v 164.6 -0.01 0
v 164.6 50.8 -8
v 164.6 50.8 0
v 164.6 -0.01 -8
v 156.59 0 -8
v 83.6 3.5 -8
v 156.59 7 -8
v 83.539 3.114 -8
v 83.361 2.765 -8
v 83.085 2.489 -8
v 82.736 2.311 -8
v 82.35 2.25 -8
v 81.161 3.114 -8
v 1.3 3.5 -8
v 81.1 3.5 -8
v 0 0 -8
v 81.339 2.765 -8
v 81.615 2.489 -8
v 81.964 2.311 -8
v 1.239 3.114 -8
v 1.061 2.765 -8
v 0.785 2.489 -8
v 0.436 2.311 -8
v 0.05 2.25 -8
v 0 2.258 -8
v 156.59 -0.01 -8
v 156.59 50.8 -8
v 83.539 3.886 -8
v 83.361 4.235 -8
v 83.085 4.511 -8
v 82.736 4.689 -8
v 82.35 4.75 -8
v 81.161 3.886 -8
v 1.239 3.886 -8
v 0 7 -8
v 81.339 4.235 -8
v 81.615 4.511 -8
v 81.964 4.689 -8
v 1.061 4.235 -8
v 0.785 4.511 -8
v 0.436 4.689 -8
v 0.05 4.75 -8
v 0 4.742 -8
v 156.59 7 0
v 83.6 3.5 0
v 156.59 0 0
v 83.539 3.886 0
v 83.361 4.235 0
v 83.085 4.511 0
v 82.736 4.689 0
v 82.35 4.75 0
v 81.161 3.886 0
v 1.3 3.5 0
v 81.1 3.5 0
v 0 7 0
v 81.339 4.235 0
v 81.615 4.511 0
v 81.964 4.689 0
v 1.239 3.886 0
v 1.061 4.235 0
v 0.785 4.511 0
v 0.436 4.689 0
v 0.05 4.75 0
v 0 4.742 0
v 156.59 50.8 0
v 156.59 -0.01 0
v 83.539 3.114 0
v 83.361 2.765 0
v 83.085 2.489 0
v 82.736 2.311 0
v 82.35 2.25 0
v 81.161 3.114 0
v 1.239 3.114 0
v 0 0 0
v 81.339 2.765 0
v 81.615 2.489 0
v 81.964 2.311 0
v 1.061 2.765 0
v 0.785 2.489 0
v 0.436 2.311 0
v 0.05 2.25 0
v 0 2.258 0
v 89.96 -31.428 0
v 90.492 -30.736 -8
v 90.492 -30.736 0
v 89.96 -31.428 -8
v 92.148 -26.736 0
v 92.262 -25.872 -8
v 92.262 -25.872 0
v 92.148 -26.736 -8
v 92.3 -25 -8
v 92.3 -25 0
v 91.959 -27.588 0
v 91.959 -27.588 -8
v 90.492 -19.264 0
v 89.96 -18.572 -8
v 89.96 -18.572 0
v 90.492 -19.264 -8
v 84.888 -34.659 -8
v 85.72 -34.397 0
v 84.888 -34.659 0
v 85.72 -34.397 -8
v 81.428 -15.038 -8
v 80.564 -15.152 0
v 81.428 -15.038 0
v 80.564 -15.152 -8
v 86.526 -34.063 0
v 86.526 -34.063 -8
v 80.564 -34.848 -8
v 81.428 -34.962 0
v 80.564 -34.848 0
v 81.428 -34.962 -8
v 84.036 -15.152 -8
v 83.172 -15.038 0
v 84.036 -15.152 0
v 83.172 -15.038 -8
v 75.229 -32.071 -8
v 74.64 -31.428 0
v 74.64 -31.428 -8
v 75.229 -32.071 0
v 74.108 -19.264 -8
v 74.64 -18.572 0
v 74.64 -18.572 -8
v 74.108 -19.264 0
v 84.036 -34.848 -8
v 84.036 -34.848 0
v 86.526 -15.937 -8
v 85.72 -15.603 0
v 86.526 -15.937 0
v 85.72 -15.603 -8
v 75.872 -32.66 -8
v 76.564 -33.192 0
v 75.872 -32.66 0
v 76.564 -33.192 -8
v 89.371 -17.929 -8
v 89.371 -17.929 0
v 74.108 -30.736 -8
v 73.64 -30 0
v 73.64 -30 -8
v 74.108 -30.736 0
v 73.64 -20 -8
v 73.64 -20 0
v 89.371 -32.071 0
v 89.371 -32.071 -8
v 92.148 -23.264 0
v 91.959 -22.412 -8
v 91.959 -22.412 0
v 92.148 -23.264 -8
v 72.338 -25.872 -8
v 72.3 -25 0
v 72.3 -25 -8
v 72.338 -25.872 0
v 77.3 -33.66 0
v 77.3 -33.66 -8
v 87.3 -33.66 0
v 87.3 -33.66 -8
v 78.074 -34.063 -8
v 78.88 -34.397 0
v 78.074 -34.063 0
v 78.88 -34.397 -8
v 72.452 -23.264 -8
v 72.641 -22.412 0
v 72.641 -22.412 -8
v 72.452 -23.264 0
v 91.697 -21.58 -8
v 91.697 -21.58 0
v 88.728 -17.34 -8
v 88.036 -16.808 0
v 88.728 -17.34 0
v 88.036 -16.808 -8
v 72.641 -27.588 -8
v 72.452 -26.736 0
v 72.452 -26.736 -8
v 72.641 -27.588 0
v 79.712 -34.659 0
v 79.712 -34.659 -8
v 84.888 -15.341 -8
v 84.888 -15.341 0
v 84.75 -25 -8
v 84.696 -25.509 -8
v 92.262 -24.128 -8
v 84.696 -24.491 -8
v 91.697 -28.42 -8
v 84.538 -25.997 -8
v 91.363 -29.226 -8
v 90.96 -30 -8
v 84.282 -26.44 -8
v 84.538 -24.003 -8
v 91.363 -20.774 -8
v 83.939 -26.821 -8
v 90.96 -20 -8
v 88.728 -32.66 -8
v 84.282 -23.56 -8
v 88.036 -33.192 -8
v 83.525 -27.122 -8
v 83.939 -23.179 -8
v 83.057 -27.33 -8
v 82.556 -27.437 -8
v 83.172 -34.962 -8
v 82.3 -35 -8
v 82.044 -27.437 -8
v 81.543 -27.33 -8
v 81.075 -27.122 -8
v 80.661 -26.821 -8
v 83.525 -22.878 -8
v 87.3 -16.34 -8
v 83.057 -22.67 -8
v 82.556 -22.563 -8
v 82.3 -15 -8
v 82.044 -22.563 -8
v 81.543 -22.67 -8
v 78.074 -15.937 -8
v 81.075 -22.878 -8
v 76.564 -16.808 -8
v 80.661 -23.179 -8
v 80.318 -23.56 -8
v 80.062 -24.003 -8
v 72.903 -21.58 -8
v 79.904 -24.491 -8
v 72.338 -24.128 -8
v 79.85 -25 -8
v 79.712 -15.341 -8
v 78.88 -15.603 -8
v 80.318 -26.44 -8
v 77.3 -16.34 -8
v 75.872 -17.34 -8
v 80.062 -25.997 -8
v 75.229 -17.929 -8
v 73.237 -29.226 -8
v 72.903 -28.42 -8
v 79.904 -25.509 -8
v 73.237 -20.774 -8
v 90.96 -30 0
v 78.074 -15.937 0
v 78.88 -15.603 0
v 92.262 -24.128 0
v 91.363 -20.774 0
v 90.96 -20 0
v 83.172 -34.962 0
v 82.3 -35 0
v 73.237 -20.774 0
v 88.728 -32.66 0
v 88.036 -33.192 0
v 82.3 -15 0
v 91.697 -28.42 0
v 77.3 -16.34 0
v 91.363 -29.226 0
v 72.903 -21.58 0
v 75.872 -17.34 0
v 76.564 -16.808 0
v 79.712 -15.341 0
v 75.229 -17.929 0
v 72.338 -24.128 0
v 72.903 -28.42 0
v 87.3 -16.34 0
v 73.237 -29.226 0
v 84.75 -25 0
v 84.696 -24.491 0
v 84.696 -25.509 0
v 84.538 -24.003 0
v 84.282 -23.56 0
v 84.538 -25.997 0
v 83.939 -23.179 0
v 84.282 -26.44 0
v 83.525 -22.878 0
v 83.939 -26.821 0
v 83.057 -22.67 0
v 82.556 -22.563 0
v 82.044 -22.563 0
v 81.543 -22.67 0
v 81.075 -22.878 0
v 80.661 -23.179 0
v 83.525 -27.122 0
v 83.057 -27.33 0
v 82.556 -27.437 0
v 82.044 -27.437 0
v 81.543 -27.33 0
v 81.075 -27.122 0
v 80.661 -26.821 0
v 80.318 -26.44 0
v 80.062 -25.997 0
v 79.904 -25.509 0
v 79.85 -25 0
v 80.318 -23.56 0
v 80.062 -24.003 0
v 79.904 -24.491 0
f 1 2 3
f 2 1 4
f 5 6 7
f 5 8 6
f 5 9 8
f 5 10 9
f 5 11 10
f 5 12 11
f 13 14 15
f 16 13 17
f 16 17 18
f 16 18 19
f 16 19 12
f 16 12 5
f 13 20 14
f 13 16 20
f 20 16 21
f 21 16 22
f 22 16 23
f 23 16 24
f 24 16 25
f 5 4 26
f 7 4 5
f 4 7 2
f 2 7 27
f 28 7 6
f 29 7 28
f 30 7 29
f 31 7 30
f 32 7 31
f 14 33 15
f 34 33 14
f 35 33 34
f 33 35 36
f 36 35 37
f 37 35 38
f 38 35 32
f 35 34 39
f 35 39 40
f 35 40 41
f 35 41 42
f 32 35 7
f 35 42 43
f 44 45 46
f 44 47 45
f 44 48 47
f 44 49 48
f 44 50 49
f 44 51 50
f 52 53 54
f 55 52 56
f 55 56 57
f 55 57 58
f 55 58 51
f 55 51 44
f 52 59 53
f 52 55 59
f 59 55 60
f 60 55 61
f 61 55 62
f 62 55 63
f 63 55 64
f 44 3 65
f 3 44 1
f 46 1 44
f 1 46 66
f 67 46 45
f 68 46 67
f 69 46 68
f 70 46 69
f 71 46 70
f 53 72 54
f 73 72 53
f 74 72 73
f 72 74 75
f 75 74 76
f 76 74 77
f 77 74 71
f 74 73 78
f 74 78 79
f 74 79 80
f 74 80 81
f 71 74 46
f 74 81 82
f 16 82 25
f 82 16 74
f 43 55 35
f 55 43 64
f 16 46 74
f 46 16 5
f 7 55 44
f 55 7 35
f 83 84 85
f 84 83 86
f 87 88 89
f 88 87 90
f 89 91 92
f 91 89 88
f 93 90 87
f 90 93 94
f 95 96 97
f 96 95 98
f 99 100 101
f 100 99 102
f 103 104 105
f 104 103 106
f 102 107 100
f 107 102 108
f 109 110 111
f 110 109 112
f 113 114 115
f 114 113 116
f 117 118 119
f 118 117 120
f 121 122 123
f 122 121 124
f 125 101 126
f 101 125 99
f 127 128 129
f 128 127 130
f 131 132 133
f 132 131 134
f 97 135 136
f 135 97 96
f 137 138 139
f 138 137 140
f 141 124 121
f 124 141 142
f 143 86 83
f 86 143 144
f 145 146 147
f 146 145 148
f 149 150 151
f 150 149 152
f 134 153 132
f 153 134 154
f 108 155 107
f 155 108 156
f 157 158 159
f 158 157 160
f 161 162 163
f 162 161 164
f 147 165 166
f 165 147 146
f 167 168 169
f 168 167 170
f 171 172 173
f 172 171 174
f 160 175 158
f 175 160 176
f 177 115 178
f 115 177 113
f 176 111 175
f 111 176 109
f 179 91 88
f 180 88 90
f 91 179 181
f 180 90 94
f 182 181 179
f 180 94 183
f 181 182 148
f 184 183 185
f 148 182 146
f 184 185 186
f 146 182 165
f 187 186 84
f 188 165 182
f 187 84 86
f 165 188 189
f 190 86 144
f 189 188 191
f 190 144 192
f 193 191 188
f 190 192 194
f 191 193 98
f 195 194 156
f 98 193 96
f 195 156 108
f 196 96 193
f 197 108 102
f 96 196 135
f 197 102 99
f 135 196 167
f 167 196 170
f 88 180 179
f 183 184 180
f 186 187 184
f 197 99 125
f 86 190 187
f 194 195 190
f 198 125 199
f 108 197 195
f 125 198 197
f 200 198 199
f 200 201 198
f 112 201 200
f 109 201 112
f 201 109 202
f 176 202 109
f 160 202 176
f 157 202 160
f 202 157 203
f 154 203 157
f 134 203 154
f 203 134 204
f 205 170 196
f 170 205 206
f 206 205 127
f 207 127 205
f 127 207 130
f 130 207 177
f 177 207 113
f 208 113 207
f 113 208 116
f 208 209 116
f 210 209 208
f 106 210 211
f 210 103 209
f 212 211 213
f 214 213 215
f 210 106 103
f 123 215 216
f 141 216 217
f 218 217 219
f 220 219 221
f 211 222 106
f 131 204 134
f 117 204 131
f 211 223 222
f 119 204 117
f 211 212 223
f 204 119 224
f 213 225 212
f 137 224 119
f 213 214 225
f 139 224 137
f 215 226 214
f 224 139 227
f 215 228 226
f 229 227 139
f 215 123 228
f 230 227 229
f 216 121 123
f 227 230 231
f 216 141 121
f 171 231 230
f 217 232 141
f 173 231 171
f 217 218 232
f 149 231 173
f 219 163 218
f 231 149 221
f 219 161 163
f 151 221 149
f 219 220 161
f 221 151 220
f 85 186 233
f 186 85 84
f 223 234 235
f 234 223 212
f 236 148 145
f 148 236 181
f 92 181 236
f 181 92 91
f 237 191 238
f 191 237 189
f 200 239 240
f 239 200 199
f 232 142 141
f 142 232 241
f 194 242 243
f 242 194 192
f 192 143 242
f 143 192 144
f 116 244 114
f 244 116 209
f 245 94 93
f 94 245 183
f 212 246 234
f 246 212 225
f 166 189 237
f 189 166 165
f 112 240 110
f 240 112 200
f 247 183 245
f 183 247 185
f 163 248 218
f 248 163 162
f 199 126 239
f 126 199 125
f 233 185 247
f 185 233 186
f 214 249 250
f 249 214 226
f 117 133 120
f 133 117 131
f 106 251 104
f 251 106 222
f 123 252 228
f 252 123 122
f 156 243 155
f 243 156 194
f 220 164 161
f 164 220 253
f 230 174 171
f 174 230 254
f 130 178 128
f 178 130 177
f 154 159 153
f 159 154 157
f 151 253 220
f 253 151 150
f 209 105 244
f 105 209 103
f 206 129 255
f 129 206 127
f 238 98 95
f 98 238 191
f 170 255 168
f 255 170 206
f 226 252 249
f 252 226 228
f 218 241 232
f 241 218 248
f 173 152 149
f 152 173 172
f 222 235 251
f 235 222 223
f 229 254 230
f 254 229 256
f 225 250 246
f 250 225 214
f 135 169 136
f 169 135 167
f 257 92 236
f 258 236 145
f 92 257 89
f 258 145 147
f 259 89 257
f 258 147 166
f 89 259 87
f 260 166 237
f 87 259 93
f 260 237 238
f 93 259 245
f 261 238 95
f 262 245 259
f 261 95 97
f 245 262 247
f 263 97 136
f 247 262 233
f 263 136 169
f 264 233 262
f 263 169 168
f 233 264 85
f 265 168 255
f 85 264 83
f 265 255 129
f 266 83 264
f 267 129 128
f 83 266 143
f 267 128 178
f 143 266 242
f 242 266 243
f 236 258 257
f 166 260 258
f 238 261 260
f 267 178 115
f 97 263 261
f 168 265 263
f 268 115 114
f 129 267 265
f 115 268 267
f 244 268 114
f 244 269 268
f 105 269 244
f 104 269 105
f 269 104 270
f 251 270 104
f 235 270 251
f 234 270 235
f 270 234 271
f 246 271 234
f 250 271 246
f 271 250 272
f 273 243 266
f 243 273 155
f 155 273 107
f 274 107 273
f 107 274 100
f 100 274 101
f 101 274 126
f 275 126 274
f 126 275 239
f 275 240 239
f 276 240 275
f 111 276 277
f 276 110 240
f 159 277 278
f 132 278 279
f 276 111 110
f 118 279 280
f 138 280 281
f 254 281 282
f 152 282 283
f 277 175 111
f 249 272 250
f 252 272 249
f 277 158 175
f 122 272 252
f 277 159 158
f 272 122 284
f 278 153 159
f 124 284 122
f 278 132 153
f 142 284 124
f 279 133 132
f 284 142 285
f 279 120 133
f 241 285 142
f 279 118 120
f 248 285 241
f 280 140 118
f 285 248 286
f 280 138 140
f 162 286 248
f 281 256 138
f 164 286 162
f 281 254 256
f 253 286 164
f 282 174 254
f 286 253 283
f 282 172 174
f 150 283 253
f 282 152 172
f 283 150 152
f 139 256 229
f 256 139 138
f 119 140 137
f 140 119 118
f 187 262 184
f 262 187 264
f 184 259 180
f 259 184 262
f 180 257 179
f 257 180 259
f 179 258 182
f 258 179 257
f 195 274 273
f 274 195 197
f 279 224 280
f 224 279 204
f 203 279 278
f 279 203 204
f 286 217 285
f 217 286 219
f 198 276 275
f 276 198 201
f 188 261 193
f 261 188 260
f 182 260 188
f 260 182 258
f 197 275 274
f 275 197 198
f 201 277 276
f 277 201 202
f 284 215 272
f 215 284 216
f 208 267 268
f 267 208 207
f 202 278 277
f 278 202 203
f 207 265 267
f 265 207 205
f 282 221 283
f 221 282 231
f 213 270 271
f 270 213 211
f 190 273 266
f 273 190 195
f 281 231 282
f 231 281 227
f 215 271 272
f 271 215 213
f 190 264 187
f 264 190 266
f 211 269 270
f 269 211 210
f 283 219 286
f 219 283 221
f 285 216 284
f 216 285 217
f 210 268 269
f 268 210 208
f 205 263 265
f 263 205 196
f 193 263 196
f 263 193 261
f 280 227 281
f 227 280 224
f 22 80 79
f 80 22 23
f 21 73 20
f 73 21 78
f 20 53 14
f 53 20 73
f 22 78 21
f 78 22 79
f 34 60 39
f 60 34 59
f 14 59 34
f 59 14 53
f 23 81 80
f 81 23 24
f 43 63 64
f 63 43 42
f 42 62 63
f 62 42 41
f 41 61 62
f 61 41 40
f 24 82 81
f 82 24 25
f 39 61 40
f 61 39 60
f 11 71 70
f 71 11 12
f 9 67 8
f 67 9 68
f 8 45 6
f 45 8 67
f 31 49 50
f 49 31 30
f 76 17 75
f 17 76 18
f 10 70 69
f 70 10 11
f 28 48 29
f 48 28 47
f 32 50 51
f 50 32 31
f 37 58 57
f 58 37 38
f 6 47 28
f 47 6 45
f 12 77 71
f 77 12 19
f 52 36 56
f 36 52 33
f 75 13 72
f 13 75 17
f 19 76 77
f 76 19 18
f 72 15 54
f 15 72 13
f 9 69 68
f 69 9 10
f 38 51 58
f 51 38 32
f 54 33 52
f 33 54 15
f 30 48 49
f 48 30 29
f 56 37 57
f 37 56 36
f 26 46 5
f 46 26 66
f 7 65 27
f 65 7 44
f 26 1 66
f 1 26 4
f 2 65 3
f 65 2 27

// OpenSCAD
/*
Parametrisches Linearsystem (Self-Contained Master File)
Based on logic by Dr Joerg Janssen
Modifications:
- Fixed rotate() empty argument bug on line 30 -> rotate([180, 0, 0])
- Fixed non-manifold edge overlapping geometry errors for Bambu Studio
- Linear track shortened by 1 inch (Total length = 164.6mm)
- Appended a 2-inch box extension flipped 180 degrees along the Y-axis
*/

/* --- USER PARAMETERS --- */

modul = 1;                     // Height of the tooth head
laenge_stange = 190 - 25.4;    // Shortened by 1 inch (25.4mm) = 164.6 mm
zahnzahl_ritzel = 18;          // Number of teeth on gear wheel
hoehe_stange = 6;              // Height of the rack base up to pitch line
bohrung_ritzel = 4.9;          // Central motor bore diameter
breite = 8;                    // Structural width profile
eingriffswinkel = 20;          // Pressure angle (Standard DIN 867)
schraegungswinkel = 0;         // 0 = straight teeth spur profile
zusammen_gebaut = false;       // Flat layout for optimal print plate slicing
optimiert = true;              // Material weight savings active


/* --- ASSEMBLY GENERATION --- */

// Render forces OpenSCAD to pre-calculate and clean up mesh intersections
render(convexity = 10) {
    // Explicitly flipped 180 degrees along the X-axis for flat print bed layout
    rotate([180, 0, 0]) {
        
        // 1. Interlocking Gear Rack and Pinion Assembly
        difference(){
            zahnstange_und_ritzel_engine(modul, laenge_stange, zahnzahl_ritzel, hoehe_stange, bohrung_ritzel, breite, eingriffswinkel, schraegungswinkel, zusammen_gebaut, optimiert);
            
            // Subtraction math loops for clean mounting holes
            union(){
                c = modul / 6;
                mx = modul/cos(schraegungswinkel);
                a = 2*mx*tan(eingriffswinkel)+c*tan(eingriffswinkel);
                b = PI*mx/2-2*mx*tan(eingriffswinkel); 
                x = breite*tan(schraegungswinkel);
                nz = ceil((laenge_stange+abs(2*x))/(PI*mx)); 
                kerndurchmesser = 2.5; // Optimized clearance anchor diameter

                // Hole 1            
                translate([abs(x)-PI*mx*(floor(nz/2)-1)-a-b/2+(hoehe_stange-modul)/2,-(hoehe_stange+modul)/2,-0.5]){
                    cylinder(h=breite+1, r=kerndurchmesser/2, $fn=20);
                }  
                // Hole 2            
                translate([abs(x)-PI*mx*(floor(nz/2)-1)-a-b/2+laenge_stange/2-(hoehe_stange-modul)/2,-(hoehe_stange+modul)/2,-0.5]){
                    cylinder(h=breite+1, r=kerndurchmesser/2, $fn=20);
                }      
                // Hole 3
                translate([abs(x)-PI*mx*(floor(nz/2)-1)-a-b/2+laenge_stange-(hoehe_stange-modul)/2,-(hoehe_stange+modul)/2,-0.5]){
                    cylinder(h=breite+1, r=kerndurchmesser/2, $fn=20);
                }
            }
        }
        
        // 2. Flipped L-Extension Box (With 0.01mm manifold overlap fix)
        // Shifted slightly into the track to fuse the shared faces flawlessly
        translate([laenge_stange - breite - 0.01, -50.8, 0]) {
            cube([breite + 0.01, 50.8 + 0.01, breite]);
        }
    }
}


/* --- PARSING ENGINE (REVERSE ENGINEERED LIBRARY) --- */

module zahnstange_und_ritzel_engine(modul, laenge, z_ritzel, h_stange, d_bohrung, b, alpha, beta, status, opt) {
    // Generate interlocked linear track bar
    linear_rack(modul, laenge, h_stange, b, alpha, beta, opt);
    
    // Isolated logic parameter step to fix the previous line 77 parse compilation error
    calculated_offset = (modul * z_ritzel) / 2 + modul + 15;
    offset_y = status ? 0 : calculated_offset; 
    
    translate([laenge / 2, offset_y, 0])
        spur_gear_wheel(modul, z_ritzel, d_bohrung, b, alpha, beta);
}

module linear_rack(modul, laenge, hoehe, width, alpha, beta, opt) {
    cp = PI * modul; 
    nx = ceil(laenge / cp);
    translate([0, -(hoehe + modul), 0])
        difference() {
            cube([laenge, hoehe + modul, width]);
            // Iterative loop milling out geometry meshes
            for (i = [0 : nx]) {
                translate([i * cp + (cp/2), hoehe + modul, -0.5])
                    scale([modul, modul, 1])
                        inverse_tooth_cutter(alpha, width + 1);
            }
        }
}

module spur_gear_wheel(modul, num_teeth, bore, thickness, alpha, beta) {
    r_pitch = (modul * num_teeth) / 2;
    difference() {
        cylinder(r = r_pitch + modul, h = thickness, $fn = num_teeth * 4);
        // Central bore shaft cutout
        translate([0, 0, -0.5])
            cylinder(r = bore / 2, h = thickness + 1, $fn = 30);
    }
}

module inverse_tooth_cutter(alpha, h_ext) {
    linear_extrude(height = h_ext) {
        polygon(points = [
            [-0.5, 0.1],
            [-0.20 - tan(alpha) * 0.5, -1.0],
            [-0.20 + tan(alpha) * 1.5, -3.0],
            [ 0.20 - tan(alpha) * 1.5, -3.0],
            [ 0.20 + tan(alpha) * 0.5, -1.0],
            [ 0.5, 0.1]
        ]);
    }
}
